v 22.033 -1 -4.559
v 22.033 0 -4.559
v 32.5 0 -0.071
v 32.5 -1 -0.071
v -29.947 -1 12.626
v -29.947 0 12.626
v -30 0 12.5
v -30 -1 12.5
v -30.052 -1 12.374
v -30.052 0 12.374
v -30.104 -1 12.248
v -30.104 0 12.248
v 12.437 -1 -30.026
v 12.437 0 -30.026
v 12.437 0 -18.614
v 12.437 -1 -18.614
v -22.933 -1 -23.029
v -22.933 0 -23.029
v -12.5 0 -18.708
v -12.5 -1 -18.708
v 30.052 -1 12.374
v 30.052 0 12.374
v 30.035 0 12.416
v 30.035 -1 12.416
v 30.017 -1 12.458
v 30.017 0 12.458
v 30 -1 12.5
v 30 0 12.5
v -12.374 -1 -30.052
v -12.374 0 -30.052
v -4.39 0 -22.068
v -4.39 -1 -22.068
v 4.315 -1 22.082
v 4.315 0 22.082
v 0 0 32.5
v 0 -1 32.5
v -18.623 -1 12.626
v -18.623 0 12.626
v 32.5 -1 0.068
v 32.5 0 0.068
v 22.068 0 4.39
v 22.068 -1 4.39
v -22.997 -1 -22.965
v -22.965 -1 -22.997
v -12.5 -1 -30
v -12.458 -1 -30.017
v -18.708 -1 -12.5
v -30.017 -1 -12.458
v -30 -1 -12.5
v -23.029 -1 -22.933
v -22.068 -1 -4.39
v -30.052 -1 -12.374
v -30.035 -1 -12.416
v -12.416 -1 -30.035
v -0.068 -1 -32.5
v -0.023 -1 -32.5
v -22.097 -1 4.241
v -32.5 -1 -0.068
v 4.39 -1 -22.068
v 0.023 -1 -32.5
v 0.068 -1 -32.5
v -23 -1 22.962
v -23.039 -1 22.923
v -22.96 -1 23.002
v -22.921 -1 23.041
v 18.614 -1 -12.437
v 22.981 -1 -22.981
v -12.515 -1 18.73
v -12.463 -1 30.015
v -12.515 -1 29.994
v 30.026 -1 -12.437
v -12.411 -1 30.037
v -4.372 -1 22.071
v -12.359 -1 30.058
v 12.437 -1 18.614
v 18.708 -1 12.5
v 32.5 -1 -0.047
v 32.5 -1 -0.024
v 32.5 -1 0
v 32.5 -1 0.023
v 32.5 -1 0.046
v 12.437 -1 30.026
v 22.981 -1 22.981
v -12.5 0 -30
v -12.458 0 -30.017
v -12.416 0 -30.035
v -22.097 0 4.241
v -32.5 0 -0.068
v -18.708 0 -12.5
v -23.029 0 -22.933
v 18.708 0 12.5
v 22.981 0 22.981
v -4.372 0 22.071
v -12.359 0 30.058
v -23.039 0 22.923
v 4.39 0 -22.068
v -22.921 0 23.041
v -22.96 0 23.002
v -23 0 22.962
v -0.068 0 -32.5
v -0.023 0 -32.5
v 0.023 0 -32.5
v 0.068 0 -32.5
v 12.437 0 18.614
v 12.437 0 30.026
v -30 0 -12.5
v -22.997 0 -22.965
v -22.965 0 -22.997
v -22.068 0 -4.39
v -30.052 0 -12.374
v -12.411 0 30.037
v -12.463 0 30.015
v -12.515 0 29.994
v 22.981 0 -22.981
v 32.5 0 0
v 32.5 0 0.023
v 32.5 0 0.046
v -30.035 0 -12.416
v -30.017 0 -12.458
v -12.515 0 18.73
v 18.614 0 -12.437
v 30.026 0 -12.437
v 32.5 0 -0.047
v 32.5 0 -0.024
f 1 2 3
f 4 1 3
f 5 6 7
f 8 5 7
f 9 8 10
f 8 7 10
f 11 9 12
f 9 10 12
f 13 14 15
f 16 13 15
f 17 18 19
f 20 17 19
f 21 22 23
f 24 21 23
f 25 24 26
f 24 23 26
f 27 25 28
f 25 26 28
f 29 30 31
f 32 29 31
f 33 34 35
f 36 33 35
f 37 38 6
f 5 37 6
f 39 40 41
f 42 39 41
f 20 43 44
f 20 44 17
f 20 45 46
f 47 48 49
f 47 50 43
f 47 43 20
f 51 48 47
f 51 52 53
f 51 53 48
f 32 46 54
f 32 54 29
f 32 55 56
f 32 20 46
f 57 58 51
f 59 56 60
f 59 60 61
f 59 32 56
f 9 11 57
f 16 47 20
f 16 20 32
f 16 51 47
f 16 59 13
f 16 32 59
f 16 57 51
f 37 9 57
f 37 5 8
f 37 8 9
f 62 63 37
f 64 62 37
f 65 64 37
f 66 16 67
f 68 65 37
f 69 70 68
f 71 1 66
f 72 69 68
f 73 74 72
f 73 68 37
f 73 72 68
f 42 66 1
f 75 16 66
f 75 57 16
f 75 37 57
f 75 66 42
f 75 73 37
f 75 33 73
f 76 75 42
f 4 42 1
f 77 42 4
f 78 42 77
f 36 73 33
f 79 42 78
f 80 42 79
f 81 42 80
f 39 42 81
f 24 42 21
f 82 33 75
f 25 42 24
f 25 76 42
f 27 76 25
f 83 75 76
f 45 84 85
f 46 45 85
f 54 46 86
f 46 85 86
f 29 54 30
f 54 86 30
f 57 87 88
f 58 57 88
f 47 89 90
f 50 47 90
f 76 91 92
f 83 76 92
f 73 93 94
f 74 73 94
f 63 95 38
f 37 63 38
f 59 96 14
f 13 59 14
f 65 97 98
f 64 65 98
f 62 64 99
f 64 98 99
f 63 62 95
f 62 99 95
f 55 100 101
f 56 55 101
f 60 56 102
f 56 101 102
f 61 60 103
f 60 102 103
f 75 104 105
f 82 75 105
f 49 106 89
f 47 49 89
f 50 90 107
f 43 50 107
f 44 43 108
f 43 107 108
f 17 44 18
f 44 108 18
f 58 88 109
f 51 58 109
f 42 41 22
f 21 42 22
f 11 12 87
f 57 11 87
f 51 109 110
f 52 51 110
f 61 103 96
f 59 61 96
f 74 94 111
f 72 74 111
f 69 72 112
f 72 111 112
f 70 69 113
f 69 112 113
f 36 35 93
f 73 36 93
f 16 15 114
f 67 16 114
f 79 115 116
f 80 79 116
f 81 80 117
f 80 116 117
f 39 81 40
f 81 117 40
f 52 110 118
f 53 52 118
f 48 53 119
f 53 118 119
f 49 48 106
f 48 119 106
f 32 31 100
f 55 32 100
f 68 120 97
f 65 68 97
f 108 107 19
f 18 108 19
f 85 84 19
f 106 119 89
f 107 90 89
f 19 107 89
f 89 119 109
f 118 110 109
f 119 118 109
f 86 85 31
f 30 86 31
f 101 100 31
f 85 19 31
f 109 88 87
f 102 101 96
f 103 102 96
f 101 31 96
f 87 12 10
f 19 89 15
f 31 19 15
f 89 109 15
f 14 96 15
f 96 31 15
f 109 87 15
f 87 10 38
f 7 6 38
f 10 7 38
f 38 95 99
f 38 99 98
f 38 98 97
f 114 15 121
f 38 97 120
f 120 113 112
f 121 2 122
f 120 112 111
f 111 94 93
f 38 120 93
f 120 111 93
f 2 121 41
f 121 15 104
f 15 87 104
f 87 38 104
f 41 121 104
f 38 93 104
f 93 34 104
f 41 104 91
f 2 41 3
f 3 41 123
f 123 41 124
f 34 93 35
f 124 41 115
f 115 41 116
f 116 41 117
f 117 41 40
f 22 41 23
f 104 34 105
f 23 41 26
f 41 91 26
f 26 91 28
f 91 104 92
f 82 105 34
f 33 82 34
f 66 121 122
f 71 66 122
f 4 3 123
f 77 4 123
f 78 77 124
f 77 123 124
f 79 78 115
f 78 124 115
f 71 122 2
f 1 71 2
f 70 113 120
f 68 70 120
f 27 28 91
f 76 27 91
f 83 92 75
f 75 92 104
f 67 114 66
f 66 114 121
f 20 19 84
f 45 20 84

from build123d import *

# Parameters (mm, degrees)
F1_DEPTH = 1


with BuildPart() as f1:
    # F0 (on Front) → F1 (new body)
    with BuildSketch(Plane.XZ):
        with BuildLine():
            Line((18.708066, 12.50033), (22.98097, 22.98097))
            Line((22.98097, 22.98097), (12.437212, 18.613602))
            Line((12.437212, 18.613602), (12.437212, 30.026085))
            Line((12.437212, 30.026085), (4.315137, 22.082337))
            Line((4.315137, 22.082337), (0, 32.5))
            Line((0, 32.5), (-4.371889, 22.071171))
            Line((-4.371889, 22.071171), (-12.359057, 30.058339))
            ThreePointArc((-12.359057, 30.058339), (-12.437212, 30.026085), (-12.515282, 29.993628))
            Line((-12.515282, 29.993628), (-12.515282, 18.730443))
            Line((-12.515282, 18.730443), (-22.921108, 23.040677))
            ThreePointArc((-22.921108, 23.040677), (-22.979929, 22.982012), (-23.0386, 22.923195))
            Line((-23.0386, 22.923195), (-18.623445, 12.626056))
            Line((-18.623445, 12.626056), (-29.947166, 12.626056))
            ThreePointArc((-29.947166, 12.626056), (-30.026085, 12.437212), (-30.103813, 12.247874))
            Line((-30.103813, 12.247874), (-22.096734, 4.240795))
            Line((-22.096734, 4.240795), (-32.499928, -0.068349))
            Line((-32.499928, -0.068349), (-22.067669, -4.389532))
            Line((-22.067669, -4.389532), (-30.052174, -12.374038))
            ThreePointArc((-30.052174, -12.374038), (-30.026085, -12.437212), (-29.999862, -12.50033))
            Line((-29.999862, -12.50033), (-18.708066, -12.50033))
            Line((-18.708066, -12.50033), (-23.02925, -22.93259))
            ThreePointArc((-23.02925, -22.93259), (-22.98097, -22.98097), (-22.93259, -23.02925))
            Line((-22.93259, -23.02925), (-12.50033, -18.708066))
            Line((-12.50033, -18.708066), (-12.50033, -29.999862))
            ThreePointArc((-12.50033, -29.999862), (-12.437212, -30.026085), (-12.374038, -30.052174))
            Line((-12.374038, -30.052174), (-4.389532, -22.067669))
            Line((-4.389532, -22.067669), (-0.068349, -32.499928))
            ThreePointArc((-0.068349, -32.499928), (0, -32.5), (0.068349, -32.499928))
            Line((0.068349, -32.499928), (4.389532, -22.067669))
            Line((4.389532, -22.067669), (12.437212, -30.026085))
            Line((12.437212, -30.026085), (12.437212, -18.613602))
            Line((12.437212, -18.613602), (22.98097, -22.98097))
            Line((22.98097, -22.98097), (18.613602, -12.437212))
            Line((18.613602, -12.437212), (30.026085, -12.437212))
            Line((30.026085, -12.437212), (22.033376, -4.558546))
            Line((22.033376, -4.558546), (32.499923, -0.070754))
            ThreePointArc((32.499923, -0.070754), (32.499981, -0.035377), (32.5, 0))
            ThreePointArc((32.5, 0), (32.499982, 0.034174), (32.499928, 0.068349))
            Line((32.499928, 0.068349), (22.067669, 4.389532))
            Line((22.067669, 4.389532), (30.052174, 12.374038))
            ThreePointArc((30.052174, 12.374038), (30.026085, 12.437212), (29.999862, 12.50033))
            Line((29.999862, 12.50033), (18.708066, 12.50033))
        make_face()
    extrude(amount=F1_DEPTH)


solid = f1.part
